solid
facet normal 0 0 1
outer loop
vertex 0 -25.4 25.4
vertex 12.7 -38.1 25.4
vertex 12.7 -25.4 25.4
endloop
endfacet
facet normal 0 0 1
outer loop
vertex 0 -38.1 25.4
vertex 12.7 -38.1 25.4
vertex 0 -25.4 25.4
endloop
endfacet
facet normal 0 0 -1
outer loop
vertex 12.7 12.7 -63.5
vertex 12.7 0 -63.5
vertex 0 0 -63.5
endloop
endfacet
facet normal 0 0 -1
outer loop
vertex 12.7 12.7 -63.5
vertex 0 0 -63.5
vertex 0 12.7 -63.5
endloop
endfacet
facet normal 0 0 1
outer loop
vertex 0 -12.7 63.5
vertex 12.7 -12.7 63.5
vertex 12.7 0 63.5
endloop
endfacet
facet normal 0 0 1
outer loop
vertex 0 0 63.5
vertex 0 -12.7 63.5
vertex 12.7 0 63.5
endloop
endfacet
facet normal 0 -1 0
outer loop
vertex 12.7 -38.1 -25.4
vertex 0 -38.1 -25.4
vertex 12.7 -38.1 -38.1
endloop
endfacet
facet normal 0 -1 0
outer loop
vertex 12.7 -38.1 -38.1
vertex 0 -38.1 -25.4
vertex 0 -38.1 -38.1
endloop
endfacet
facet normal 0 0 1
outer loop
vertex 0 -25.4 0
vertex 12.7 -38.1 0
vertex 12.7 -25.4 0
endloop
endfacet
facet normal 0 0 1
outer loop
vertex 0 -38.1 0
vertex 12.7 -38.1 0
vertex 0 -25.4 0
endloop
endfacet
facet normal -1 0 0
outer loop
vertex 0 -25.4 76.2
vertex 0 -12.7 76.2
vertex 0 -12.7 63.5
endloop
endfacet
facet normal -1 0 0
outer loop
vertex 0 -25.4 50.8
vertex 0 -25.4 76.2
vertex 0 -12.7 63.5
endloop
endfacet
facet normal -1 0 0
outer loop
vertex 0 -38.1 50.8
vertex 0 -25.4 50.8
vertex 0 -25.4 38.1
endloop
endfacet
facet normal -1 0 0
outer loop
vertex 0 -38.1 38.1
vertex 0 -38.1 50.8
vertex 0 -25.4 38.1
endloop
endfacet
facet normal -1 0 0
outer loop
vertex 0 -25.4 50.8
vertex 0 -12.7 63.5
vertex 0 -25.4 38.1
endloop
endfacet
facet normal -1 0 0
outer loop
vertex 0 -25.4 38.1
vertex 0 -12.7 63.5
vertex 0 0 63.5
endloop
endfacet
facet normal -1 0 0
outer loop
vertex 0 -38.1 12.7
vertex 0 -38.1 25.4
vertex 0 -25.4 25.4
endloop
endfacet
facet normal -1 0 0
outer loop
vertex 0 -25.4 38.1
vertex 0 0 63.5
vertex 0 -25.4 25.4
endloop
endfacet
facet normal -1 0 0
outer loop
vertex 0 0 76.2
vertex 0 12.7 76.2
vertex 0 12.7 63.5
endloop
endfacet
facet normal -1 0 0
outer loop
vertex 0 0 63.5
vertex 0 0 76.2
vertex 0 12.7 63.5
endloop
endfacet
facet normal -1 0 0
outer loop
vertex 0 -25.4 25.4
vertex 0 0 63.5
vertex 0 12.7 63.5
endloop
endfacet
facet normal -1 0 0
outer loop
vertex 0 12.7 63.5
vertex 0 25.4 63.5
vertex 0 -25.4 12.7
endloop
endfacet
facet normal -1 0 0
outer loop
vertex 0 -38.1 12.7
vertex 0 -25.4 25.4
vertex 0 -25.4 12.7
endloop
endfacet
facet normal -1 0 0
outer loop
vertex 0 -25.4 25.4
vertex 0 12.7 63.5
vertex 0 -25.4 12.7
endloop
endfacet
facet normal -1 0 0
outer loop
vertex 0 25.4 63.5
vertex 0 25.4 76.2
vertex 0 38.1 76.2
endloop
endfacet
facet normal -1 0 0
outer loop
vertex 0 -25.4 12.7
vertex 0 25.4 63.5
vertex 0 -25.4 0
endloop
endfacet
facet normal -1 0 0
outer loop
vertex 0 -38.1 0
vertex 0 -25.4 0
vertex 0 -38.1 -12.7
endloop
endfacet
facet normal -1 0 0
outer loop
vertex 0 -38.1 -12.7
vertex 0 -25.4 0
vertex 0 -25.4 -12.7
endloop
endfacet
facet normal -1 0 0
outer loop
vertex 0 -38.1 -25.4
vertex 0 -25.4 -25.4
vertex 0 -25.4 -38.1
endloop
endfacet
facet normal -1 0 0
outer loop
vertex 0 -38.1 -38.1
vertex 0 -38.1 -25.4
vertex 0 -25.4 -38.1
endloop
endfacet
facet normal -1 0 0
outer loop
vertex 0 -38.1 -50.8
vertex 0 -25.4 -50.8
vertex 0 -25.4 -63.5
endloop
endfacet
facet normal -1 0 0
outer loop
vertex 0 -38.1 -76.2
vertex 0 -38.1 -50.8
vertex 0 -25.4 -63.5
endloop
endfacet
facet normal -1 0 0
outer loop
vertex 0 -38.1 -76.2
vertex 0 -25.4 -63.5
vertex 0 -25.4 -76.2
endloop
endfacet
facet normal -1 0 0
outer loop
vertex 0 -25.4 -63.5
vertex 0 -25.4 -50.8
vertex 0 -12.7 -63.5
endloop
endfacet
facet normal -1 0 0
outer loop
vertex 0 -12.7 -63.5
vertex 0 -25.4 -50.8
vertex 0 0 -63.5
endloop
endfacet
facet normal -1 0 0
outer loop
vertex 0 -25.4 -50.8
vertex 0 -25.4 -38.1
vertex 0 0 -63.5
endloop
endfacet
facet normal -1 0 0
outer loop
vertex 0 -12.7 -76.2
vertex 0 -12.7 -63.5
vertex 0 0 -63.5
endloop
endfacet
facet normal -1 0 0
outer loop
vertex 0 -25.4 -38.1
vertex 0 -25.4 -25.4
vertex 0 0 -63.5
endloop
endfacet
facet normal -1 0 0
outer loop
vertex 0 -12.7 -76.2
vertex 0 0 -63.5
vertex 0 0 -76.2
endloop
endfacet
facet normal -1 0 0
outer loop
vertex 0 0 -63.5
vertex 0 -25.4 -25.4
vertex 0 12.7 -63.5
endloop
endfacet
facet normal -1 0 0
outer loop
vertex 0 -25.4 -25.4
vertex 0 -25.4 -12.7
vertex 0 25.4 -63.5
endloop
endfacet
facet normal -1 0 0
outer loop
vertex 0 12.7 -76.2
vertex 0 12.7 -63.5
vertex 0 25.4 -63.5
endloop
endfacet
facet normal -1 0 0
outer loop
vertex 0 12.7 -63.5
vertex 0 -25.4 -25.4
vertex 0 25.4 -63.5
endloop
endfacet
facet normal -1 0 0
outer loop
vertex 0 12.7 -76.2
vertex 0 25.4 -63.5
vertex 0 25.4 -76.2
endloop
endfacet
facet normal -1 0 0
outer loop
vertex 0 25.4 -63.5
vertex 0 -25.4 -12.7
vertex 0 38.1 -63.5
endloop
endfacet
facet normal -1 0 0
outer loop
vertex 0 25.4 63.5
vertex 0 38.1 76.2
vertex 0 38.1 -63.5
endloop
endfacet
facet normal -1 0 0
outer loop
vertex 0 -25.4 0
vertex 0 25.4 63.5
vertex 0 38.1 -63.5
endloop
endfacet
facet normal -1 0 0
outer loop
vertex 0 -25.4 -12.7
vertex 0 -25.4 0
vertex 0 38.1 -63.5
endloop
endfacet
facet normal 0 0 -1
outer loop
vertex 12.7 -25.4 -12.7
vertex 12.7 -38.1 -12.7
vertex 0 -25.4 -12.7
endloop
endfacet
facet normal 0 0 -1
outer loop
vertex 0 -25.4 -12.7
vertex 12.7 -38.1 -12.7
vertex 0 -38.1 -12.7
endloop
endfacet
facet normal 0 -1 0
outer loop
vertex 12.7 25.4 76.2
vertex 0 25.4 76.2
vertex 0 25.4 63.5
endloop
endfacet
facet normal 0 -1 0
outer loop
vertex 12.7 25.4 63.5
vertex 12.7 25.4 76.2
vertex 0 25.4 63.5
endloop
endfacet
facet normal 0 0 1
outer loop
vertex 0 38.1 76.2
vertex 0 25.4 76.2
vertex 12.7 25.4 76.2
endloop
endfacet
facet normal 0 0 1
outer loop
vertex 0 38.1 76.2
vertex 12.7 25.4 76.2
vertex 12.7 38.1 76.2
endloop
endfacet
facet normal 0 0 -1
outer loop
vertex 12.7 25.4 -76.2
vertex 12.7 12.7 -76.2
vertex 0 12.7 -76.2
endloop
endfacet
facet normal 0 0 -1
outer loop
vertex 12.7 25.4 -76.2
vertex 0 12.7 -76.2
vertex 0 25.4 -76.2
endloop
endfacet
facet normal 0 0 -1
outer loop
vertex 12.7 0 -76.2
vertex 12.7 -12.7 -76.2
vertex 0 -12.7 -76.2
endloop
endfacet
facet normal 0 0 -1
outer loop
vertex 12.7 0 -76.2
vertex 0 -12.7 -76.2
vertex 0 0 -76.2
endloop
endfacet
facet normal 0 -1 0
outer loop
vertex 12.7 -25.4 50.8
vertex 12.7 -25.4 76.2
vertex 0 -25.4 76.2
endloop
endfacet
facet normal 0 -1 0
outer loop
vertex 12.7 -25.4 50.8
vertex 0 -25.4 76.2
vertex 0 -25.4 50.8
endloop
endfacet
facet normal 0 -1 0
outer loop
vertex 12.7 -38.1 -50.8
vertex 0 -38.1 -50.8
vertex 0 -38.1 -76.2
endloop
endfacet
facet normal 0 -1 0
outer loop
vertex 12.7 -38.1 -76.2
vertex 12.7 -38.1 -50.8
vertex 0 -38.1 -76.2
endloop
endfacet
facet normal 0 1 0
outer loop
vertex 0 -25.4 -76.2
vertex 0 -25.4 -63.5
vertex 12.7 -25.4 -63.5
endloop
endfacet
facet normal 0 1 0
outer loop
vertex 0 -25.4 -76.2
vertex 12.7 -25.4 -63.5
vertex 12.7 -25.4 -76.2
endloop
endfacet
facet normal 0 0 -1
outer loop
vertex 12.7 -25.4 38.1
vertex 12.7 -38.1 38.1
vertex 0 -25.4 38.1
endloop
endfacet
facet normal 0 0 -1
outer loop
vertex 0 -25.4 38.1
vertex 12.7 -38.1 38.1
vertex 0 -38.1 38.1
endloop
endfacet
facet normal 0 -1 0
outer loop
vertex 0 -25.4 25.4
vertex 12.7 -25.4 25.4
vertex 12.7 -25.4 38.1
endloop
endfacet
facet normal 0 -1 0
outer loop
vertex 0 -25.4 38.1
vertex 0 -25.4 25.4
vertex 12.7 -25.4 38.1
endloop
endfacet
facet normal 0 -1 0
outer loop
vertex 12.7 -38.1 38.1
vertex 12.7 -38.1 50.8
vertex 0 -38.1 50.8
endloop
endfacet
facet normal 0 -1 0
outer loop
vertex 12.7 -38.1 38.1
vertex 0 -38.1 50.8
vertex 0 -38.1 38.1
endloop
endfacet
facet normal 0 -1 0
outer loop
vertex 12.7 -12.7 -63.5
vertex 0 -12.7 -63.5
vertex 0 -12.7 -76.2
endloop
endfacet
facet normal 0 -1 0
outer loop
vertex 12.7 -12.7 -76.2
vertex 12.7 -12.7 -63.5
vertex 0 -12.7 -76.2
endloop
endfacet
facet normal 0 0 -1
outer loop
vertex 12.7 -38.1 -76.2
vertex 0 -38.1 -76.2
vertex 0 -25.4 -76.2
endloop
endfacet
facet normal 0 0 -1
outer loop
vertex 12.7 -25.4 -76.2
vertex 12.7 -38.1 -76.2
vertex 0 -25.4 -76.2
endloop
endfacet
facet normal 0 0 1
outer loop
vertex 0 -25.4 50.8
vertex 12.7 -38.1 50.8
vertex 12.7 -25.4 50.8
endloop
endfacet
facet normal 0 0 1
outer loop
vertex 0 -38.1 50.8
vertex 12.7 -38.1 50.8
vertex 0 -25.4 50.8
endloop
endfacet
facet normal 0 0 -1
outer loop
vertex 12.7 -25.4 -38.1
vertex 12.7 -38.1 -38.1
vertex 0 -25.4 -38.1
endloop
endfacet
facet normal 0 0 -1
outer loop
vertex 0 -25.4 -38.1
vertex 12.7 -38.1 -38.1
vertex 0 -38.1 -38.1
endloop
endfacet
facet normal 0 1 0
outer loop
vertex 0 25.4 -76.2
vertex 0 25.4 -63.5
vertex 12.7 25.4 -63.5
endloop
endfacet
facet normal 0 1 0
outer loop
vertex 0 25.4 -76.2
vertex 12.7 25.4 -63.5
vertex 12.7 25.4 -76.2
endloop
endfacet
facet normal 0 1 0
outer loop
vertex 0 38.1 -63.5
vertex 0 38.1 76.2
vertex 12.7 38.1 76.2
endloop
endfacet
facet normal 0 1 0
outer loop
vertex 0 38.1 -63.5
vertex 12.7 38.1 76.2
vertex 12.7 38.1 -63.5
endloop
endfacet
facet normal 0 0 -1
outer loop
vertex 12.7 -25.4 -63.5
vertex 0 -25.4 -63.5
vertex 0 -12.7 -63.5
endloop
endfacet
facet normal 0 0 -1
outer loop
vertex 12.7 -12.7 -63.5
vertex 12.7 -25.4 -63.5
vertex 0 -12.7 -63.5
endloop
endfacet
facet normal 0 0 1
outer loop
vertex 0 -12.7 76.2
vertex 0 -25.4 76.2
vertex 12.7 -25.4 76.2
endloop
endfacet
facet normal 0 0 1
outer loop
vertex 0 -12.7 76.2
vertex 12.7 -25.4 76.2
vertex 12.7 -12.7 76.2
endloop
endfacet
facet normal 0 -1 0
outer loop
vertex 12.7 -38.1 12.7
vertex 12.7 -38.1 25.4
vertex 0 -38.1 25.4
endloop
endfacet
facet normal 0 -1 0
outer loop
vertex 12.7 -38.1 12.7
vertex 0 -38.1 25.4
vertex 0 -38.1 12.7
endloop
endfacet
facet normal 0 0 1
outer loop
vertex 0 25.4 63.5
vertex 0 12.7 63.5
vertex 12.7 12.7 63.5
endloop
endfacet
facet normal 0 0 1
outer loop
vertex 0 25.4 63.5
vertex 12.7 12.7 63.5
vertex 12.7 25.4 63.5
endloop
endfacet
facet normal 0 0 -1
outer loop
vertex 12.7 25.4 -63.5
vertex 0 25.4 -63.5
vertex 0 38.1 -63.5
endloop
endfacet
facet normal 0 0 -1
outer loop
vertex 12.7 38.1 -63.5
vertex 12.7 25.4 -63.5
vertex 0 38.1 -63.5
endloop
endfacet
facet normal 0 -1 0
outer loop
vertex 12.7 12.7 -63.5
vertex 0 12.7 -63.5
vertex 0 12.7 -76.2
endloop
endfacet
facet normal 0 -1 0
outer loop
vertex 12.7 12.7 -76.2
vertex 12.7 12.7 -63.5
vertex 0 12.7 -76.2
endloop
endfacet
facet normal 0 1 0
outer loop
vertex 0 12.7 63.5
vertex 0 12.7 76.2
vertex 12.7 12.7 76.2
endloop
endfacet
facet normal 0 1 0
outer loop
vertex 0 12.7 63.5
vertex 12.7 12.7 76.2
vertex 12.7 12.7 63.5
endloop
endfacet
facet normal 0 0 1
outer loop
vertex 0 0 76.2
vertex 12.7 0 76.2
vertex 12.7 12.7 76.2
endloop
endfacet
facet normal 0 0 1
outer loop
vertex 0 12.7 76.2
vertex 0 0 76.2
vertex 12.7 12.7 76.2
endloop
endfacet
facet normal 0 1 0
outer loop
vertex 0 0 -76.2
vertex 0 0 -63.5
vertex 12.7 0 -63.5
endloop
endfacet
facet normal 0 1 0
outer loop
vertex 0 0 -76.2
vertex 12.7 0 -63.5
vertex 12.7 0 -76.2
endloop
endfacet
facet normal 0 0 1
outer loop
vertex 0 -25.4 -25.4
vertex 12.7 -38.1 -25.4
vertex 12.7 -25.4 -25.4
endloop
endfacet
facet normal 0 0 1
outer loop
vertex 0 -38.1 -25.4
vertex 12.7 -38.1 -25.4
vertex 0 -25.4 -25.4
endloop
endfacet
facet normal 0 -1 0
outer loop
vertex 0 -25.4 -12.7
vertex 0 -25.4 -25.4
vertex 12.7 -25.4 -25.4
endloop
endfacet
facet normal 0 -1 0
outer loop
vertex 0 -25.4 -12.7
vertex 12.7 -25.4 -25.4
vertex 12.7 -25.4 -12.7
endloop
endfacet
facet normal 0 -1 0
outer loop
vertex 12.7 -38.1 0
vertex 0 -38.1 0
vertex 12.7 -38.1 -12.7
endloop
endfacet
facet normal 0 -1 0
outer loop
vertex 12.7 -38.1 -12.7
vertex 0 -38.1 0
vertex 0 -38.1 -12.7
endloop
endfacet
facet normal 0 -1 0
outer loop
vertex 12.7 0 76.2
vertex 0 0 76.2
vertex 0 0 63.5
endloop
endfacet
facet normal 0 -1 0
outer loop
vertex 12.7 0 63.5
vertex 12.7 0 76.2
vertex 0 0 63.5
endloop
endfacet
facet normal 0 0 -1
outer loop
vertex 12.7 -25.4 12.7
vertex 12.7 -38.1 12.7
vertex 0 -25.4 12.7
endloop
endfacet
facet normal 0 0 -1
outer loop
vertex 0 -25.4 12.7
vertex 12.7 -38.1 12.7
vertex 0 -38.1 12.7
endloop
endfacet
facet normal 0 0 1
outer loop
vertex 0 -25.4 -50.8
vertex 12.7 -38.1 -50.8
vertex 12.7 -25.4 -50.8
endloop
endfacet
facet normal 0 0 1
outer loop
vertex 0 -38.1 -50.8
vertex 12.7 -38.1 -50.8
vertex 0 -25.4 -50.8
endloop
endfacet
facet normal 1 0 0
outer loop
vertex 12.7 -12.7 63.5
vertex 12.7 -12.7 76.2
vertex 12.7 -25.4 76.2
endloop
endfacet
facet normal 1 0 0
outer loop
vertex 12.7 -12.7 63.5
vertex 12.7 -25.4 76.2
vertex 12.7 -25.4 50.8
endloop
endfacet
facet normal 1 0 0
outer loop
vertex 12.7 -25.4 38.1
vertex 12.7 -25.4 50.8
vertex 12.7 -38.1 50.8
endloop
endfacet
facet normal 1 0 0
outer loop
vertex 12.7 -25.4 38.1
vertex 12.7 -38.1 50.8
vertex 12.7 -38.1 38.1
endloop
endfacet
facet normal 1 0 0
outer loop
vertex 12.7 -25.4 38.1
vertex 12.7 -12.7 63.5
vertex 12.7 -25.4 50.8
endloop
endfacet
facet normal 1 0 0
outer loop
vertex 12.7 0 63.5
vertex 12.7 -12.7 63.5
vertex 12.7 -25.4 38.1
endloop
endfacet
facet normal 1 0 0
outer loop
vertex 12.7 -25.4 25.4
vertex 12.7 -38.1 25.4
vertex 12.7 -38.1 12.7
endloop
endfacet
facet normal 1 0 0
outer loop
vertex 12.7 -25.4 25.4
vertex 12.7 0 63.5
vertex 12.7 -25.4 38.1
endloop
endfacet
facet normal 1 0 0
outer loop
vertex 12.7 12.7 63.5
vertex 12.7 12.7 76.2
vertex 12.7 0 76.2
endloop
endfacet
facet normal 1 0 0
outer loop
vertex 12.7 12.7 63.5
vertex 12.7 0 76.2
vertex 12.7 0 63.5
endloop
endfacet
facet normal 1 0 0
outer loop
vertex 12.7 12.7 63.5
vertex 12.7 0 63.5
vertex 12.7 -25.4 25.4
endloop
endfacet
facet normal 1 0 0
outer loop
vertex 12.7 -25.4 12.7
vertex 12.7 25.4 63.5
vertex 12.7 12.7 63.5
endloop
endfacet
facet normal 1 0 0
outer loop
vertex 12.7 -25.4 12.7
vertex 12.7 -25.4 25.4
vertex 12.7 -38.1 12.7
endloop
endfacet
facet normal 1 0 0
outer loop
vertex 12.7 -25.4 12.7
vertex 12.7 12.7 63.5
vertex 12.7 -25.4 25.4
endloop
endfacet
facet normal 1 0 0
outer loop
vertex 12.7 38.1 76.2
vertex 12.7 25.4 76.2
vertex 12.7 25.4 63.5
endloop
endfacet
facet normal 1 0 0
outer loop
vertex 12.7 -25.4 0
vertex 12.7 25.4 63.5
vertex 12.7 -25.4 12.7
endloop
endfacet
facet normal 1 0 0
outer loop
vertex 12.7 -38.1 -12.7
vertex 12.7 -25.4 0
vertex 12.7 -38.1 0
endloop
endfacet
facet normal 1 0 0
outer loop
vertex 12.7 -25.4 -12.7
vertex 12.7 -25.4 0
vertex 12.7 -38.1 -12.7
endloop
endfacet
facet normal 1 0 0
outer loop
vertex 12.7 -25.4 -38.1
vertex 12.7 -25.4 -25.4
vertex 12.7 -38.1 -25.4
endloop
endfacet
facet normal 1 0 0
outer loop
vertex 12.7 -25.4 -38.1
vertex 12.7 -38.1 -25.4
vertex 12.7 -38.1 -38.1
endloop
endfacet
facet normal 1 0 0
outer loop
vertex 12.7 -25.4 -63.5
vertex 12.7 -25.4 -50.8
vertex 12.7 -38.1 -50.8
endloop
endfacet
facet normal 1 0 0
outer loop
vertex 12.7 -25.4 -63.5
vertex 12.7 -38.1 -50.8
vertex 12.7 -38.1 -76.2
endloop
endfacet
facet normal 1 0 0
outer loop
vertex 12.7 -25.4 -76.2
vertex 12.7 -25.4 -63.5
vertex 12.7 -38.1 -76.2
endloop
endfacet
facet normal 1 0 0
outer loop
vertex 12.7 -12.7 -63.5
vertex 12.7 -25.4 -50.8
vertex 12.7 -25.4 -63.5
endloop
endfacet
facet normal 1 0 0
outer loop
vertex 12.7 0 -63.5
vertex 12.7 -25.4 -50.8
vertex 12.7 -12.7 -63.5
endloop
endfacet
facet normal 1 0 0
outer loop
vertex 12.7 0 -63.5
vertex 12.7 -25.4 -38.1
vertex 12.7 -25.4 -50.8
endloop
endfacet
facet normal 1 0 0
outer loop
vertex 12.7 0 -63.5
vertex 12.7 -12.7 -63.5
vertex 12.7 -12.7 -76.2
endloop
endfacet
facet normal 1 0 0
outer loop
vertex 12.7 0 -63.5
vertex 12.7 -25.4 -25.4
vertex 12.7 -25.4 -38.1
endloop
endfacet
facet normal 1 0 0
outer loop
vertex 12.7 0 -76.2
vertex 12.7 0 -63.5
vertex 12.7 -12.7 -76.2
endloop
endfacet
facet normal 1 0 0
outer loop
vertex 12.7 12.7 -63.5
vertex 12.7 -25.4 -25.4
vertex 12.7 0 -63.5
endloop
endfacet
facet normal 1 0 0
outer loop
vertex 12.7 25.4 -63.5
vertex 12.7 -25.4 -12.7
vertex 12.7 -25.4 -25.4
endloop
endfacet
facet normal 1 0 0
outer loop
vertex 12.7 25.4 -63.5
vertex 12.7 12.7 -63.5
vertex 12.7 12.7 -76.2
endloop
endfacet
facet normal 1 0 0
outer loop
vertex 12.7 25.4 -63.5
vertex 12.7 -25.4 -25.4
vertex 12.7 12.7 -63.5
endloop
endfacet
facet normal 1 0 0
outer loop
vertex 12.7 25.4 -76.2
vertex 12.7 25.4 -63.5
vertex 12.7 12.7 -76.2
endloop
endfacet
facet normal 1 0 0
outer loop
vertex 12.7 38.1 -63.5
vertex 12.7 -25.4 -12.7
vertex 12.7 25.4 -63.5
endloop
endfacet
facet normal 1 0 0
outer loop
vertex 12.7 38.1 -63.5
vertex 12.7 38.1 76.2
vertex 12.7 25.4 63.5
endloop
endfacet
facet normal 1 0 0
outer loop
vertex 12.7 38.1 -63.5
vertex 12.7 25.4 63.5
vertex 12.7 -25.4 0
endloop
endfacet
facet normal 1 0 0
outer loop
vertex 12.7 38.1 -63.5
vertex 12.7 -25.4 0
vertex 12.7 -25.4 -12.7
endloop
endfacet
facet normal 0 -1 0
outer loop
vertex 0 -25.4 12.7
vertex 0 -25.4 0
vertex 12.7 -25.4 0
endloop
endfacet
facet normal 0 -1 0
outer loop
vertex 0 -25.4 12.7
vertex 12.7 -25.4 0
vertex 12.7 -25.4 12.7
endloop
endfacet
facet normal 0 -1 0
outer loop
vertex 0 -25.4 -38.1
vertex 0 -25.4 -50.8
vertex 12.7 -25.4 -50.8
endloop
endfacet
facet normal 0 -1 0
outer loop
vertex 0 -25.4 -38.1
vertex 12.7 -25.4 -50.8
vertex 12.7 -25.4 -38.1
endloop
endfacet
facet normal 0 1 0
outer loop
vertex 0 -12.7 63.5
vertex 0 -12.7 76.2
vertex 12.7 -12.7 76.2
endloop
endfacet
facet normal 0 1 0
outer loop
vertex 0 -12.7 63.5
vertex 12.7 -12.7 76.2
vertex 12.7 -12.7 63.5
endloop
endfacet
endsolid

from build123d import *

# Parameters (mm, degrees)
SKETCH1_W           = 152.4
SKETCH1_H           = 76.2
BOSS_EXTRUDE1_DEPTH = 12.7
SKETCH2_W           = 12.7
SKETCH2_H           = 12.7
CUT_EXTRUDE1_DEPTH  = 87.135590786
SKETCH3_W           = 12.7
SKETCH3_H           = 12.7
CUT_EXTRUDE2_DEPTH  = 12.7


with BuildPart() as part:
    # Sketch1 → Boss-Extrude1 (new body)
    with BuildSketch(Plane(origin=(0, 0, 0), x_dir=(0, 0, -1), z_dir=(1, 0, 0))):
        Rectangle(SKETCH1_W, SKETCH1_H)
    extrude(amount=BOSS_EXTRUDE1_DEPTH)

    # Sketch2 → Cut-Extrude1 (cut, through all)
    with BuildSketch(Plane(origin=(12.7, 0, 0), x_dir=(0, 0, -1), z_dir=(1, 0, 0))):
        with Locations((-69.85, 19.05)):
            Rectangle(SKETCH2_W, SKETCH2_H)
        with Locations((-69.85, -6.35)):
            Rectangle(SKETCH2_W, SKETCH2_H)
        with Locations((-69.85, -31.75)):
            Rectangle(SKETCH2_W, SKETCH2_H)
        with Locations((69.85, 31.75)):
            Rectangle(SKETCH2_W, SKETCH2_H)
        with Locations((69.85, 6.35)):
            Rectangle(SKETCH2_W, SKETCH2_H)
        with Locations((69.85, -19.05)):
            Rectangle(SKETCH2_W, SKETCH2_H)
    extrude(amount=-CUT_EXTRUDE1_DEPTH, mode=Mode.SUBTRACT)

    # Sketch3 → Cut-Extrude2 (cut)
    with BuildSketch(Plane(origin=(90.45925552, -38.1, 56.334406979), x_dir=(0, 0, 1), z_dir=(0, -1, 0))):
        with Locations((-100.784406979, 84.10925552)):
            Rectangle(SKETCH3_W, SKETCH3_H)
        with Locations((-75.384406979, 84.10925552)):
            Rectangle(SKETCH3_W, SKETCH3_H)
        with Locations((-49.984406979, 84.10925552)):
            Rectangle(SKETCH3_W, SKETCH3_H)
        with Locations((-24.584406979, 84.10925552)):
            Rectangle(SKETCH3_W, SKETCH3_H)
        with Locations((0.815593021, 84.10925552)):
            Rectangle(SKETCH3_W, SKETCH3_H)
    extrude(amount=-CUT_EXTRUDE2_DEPTH, mode=Mode.SUBTRACT)


solid = part.part
